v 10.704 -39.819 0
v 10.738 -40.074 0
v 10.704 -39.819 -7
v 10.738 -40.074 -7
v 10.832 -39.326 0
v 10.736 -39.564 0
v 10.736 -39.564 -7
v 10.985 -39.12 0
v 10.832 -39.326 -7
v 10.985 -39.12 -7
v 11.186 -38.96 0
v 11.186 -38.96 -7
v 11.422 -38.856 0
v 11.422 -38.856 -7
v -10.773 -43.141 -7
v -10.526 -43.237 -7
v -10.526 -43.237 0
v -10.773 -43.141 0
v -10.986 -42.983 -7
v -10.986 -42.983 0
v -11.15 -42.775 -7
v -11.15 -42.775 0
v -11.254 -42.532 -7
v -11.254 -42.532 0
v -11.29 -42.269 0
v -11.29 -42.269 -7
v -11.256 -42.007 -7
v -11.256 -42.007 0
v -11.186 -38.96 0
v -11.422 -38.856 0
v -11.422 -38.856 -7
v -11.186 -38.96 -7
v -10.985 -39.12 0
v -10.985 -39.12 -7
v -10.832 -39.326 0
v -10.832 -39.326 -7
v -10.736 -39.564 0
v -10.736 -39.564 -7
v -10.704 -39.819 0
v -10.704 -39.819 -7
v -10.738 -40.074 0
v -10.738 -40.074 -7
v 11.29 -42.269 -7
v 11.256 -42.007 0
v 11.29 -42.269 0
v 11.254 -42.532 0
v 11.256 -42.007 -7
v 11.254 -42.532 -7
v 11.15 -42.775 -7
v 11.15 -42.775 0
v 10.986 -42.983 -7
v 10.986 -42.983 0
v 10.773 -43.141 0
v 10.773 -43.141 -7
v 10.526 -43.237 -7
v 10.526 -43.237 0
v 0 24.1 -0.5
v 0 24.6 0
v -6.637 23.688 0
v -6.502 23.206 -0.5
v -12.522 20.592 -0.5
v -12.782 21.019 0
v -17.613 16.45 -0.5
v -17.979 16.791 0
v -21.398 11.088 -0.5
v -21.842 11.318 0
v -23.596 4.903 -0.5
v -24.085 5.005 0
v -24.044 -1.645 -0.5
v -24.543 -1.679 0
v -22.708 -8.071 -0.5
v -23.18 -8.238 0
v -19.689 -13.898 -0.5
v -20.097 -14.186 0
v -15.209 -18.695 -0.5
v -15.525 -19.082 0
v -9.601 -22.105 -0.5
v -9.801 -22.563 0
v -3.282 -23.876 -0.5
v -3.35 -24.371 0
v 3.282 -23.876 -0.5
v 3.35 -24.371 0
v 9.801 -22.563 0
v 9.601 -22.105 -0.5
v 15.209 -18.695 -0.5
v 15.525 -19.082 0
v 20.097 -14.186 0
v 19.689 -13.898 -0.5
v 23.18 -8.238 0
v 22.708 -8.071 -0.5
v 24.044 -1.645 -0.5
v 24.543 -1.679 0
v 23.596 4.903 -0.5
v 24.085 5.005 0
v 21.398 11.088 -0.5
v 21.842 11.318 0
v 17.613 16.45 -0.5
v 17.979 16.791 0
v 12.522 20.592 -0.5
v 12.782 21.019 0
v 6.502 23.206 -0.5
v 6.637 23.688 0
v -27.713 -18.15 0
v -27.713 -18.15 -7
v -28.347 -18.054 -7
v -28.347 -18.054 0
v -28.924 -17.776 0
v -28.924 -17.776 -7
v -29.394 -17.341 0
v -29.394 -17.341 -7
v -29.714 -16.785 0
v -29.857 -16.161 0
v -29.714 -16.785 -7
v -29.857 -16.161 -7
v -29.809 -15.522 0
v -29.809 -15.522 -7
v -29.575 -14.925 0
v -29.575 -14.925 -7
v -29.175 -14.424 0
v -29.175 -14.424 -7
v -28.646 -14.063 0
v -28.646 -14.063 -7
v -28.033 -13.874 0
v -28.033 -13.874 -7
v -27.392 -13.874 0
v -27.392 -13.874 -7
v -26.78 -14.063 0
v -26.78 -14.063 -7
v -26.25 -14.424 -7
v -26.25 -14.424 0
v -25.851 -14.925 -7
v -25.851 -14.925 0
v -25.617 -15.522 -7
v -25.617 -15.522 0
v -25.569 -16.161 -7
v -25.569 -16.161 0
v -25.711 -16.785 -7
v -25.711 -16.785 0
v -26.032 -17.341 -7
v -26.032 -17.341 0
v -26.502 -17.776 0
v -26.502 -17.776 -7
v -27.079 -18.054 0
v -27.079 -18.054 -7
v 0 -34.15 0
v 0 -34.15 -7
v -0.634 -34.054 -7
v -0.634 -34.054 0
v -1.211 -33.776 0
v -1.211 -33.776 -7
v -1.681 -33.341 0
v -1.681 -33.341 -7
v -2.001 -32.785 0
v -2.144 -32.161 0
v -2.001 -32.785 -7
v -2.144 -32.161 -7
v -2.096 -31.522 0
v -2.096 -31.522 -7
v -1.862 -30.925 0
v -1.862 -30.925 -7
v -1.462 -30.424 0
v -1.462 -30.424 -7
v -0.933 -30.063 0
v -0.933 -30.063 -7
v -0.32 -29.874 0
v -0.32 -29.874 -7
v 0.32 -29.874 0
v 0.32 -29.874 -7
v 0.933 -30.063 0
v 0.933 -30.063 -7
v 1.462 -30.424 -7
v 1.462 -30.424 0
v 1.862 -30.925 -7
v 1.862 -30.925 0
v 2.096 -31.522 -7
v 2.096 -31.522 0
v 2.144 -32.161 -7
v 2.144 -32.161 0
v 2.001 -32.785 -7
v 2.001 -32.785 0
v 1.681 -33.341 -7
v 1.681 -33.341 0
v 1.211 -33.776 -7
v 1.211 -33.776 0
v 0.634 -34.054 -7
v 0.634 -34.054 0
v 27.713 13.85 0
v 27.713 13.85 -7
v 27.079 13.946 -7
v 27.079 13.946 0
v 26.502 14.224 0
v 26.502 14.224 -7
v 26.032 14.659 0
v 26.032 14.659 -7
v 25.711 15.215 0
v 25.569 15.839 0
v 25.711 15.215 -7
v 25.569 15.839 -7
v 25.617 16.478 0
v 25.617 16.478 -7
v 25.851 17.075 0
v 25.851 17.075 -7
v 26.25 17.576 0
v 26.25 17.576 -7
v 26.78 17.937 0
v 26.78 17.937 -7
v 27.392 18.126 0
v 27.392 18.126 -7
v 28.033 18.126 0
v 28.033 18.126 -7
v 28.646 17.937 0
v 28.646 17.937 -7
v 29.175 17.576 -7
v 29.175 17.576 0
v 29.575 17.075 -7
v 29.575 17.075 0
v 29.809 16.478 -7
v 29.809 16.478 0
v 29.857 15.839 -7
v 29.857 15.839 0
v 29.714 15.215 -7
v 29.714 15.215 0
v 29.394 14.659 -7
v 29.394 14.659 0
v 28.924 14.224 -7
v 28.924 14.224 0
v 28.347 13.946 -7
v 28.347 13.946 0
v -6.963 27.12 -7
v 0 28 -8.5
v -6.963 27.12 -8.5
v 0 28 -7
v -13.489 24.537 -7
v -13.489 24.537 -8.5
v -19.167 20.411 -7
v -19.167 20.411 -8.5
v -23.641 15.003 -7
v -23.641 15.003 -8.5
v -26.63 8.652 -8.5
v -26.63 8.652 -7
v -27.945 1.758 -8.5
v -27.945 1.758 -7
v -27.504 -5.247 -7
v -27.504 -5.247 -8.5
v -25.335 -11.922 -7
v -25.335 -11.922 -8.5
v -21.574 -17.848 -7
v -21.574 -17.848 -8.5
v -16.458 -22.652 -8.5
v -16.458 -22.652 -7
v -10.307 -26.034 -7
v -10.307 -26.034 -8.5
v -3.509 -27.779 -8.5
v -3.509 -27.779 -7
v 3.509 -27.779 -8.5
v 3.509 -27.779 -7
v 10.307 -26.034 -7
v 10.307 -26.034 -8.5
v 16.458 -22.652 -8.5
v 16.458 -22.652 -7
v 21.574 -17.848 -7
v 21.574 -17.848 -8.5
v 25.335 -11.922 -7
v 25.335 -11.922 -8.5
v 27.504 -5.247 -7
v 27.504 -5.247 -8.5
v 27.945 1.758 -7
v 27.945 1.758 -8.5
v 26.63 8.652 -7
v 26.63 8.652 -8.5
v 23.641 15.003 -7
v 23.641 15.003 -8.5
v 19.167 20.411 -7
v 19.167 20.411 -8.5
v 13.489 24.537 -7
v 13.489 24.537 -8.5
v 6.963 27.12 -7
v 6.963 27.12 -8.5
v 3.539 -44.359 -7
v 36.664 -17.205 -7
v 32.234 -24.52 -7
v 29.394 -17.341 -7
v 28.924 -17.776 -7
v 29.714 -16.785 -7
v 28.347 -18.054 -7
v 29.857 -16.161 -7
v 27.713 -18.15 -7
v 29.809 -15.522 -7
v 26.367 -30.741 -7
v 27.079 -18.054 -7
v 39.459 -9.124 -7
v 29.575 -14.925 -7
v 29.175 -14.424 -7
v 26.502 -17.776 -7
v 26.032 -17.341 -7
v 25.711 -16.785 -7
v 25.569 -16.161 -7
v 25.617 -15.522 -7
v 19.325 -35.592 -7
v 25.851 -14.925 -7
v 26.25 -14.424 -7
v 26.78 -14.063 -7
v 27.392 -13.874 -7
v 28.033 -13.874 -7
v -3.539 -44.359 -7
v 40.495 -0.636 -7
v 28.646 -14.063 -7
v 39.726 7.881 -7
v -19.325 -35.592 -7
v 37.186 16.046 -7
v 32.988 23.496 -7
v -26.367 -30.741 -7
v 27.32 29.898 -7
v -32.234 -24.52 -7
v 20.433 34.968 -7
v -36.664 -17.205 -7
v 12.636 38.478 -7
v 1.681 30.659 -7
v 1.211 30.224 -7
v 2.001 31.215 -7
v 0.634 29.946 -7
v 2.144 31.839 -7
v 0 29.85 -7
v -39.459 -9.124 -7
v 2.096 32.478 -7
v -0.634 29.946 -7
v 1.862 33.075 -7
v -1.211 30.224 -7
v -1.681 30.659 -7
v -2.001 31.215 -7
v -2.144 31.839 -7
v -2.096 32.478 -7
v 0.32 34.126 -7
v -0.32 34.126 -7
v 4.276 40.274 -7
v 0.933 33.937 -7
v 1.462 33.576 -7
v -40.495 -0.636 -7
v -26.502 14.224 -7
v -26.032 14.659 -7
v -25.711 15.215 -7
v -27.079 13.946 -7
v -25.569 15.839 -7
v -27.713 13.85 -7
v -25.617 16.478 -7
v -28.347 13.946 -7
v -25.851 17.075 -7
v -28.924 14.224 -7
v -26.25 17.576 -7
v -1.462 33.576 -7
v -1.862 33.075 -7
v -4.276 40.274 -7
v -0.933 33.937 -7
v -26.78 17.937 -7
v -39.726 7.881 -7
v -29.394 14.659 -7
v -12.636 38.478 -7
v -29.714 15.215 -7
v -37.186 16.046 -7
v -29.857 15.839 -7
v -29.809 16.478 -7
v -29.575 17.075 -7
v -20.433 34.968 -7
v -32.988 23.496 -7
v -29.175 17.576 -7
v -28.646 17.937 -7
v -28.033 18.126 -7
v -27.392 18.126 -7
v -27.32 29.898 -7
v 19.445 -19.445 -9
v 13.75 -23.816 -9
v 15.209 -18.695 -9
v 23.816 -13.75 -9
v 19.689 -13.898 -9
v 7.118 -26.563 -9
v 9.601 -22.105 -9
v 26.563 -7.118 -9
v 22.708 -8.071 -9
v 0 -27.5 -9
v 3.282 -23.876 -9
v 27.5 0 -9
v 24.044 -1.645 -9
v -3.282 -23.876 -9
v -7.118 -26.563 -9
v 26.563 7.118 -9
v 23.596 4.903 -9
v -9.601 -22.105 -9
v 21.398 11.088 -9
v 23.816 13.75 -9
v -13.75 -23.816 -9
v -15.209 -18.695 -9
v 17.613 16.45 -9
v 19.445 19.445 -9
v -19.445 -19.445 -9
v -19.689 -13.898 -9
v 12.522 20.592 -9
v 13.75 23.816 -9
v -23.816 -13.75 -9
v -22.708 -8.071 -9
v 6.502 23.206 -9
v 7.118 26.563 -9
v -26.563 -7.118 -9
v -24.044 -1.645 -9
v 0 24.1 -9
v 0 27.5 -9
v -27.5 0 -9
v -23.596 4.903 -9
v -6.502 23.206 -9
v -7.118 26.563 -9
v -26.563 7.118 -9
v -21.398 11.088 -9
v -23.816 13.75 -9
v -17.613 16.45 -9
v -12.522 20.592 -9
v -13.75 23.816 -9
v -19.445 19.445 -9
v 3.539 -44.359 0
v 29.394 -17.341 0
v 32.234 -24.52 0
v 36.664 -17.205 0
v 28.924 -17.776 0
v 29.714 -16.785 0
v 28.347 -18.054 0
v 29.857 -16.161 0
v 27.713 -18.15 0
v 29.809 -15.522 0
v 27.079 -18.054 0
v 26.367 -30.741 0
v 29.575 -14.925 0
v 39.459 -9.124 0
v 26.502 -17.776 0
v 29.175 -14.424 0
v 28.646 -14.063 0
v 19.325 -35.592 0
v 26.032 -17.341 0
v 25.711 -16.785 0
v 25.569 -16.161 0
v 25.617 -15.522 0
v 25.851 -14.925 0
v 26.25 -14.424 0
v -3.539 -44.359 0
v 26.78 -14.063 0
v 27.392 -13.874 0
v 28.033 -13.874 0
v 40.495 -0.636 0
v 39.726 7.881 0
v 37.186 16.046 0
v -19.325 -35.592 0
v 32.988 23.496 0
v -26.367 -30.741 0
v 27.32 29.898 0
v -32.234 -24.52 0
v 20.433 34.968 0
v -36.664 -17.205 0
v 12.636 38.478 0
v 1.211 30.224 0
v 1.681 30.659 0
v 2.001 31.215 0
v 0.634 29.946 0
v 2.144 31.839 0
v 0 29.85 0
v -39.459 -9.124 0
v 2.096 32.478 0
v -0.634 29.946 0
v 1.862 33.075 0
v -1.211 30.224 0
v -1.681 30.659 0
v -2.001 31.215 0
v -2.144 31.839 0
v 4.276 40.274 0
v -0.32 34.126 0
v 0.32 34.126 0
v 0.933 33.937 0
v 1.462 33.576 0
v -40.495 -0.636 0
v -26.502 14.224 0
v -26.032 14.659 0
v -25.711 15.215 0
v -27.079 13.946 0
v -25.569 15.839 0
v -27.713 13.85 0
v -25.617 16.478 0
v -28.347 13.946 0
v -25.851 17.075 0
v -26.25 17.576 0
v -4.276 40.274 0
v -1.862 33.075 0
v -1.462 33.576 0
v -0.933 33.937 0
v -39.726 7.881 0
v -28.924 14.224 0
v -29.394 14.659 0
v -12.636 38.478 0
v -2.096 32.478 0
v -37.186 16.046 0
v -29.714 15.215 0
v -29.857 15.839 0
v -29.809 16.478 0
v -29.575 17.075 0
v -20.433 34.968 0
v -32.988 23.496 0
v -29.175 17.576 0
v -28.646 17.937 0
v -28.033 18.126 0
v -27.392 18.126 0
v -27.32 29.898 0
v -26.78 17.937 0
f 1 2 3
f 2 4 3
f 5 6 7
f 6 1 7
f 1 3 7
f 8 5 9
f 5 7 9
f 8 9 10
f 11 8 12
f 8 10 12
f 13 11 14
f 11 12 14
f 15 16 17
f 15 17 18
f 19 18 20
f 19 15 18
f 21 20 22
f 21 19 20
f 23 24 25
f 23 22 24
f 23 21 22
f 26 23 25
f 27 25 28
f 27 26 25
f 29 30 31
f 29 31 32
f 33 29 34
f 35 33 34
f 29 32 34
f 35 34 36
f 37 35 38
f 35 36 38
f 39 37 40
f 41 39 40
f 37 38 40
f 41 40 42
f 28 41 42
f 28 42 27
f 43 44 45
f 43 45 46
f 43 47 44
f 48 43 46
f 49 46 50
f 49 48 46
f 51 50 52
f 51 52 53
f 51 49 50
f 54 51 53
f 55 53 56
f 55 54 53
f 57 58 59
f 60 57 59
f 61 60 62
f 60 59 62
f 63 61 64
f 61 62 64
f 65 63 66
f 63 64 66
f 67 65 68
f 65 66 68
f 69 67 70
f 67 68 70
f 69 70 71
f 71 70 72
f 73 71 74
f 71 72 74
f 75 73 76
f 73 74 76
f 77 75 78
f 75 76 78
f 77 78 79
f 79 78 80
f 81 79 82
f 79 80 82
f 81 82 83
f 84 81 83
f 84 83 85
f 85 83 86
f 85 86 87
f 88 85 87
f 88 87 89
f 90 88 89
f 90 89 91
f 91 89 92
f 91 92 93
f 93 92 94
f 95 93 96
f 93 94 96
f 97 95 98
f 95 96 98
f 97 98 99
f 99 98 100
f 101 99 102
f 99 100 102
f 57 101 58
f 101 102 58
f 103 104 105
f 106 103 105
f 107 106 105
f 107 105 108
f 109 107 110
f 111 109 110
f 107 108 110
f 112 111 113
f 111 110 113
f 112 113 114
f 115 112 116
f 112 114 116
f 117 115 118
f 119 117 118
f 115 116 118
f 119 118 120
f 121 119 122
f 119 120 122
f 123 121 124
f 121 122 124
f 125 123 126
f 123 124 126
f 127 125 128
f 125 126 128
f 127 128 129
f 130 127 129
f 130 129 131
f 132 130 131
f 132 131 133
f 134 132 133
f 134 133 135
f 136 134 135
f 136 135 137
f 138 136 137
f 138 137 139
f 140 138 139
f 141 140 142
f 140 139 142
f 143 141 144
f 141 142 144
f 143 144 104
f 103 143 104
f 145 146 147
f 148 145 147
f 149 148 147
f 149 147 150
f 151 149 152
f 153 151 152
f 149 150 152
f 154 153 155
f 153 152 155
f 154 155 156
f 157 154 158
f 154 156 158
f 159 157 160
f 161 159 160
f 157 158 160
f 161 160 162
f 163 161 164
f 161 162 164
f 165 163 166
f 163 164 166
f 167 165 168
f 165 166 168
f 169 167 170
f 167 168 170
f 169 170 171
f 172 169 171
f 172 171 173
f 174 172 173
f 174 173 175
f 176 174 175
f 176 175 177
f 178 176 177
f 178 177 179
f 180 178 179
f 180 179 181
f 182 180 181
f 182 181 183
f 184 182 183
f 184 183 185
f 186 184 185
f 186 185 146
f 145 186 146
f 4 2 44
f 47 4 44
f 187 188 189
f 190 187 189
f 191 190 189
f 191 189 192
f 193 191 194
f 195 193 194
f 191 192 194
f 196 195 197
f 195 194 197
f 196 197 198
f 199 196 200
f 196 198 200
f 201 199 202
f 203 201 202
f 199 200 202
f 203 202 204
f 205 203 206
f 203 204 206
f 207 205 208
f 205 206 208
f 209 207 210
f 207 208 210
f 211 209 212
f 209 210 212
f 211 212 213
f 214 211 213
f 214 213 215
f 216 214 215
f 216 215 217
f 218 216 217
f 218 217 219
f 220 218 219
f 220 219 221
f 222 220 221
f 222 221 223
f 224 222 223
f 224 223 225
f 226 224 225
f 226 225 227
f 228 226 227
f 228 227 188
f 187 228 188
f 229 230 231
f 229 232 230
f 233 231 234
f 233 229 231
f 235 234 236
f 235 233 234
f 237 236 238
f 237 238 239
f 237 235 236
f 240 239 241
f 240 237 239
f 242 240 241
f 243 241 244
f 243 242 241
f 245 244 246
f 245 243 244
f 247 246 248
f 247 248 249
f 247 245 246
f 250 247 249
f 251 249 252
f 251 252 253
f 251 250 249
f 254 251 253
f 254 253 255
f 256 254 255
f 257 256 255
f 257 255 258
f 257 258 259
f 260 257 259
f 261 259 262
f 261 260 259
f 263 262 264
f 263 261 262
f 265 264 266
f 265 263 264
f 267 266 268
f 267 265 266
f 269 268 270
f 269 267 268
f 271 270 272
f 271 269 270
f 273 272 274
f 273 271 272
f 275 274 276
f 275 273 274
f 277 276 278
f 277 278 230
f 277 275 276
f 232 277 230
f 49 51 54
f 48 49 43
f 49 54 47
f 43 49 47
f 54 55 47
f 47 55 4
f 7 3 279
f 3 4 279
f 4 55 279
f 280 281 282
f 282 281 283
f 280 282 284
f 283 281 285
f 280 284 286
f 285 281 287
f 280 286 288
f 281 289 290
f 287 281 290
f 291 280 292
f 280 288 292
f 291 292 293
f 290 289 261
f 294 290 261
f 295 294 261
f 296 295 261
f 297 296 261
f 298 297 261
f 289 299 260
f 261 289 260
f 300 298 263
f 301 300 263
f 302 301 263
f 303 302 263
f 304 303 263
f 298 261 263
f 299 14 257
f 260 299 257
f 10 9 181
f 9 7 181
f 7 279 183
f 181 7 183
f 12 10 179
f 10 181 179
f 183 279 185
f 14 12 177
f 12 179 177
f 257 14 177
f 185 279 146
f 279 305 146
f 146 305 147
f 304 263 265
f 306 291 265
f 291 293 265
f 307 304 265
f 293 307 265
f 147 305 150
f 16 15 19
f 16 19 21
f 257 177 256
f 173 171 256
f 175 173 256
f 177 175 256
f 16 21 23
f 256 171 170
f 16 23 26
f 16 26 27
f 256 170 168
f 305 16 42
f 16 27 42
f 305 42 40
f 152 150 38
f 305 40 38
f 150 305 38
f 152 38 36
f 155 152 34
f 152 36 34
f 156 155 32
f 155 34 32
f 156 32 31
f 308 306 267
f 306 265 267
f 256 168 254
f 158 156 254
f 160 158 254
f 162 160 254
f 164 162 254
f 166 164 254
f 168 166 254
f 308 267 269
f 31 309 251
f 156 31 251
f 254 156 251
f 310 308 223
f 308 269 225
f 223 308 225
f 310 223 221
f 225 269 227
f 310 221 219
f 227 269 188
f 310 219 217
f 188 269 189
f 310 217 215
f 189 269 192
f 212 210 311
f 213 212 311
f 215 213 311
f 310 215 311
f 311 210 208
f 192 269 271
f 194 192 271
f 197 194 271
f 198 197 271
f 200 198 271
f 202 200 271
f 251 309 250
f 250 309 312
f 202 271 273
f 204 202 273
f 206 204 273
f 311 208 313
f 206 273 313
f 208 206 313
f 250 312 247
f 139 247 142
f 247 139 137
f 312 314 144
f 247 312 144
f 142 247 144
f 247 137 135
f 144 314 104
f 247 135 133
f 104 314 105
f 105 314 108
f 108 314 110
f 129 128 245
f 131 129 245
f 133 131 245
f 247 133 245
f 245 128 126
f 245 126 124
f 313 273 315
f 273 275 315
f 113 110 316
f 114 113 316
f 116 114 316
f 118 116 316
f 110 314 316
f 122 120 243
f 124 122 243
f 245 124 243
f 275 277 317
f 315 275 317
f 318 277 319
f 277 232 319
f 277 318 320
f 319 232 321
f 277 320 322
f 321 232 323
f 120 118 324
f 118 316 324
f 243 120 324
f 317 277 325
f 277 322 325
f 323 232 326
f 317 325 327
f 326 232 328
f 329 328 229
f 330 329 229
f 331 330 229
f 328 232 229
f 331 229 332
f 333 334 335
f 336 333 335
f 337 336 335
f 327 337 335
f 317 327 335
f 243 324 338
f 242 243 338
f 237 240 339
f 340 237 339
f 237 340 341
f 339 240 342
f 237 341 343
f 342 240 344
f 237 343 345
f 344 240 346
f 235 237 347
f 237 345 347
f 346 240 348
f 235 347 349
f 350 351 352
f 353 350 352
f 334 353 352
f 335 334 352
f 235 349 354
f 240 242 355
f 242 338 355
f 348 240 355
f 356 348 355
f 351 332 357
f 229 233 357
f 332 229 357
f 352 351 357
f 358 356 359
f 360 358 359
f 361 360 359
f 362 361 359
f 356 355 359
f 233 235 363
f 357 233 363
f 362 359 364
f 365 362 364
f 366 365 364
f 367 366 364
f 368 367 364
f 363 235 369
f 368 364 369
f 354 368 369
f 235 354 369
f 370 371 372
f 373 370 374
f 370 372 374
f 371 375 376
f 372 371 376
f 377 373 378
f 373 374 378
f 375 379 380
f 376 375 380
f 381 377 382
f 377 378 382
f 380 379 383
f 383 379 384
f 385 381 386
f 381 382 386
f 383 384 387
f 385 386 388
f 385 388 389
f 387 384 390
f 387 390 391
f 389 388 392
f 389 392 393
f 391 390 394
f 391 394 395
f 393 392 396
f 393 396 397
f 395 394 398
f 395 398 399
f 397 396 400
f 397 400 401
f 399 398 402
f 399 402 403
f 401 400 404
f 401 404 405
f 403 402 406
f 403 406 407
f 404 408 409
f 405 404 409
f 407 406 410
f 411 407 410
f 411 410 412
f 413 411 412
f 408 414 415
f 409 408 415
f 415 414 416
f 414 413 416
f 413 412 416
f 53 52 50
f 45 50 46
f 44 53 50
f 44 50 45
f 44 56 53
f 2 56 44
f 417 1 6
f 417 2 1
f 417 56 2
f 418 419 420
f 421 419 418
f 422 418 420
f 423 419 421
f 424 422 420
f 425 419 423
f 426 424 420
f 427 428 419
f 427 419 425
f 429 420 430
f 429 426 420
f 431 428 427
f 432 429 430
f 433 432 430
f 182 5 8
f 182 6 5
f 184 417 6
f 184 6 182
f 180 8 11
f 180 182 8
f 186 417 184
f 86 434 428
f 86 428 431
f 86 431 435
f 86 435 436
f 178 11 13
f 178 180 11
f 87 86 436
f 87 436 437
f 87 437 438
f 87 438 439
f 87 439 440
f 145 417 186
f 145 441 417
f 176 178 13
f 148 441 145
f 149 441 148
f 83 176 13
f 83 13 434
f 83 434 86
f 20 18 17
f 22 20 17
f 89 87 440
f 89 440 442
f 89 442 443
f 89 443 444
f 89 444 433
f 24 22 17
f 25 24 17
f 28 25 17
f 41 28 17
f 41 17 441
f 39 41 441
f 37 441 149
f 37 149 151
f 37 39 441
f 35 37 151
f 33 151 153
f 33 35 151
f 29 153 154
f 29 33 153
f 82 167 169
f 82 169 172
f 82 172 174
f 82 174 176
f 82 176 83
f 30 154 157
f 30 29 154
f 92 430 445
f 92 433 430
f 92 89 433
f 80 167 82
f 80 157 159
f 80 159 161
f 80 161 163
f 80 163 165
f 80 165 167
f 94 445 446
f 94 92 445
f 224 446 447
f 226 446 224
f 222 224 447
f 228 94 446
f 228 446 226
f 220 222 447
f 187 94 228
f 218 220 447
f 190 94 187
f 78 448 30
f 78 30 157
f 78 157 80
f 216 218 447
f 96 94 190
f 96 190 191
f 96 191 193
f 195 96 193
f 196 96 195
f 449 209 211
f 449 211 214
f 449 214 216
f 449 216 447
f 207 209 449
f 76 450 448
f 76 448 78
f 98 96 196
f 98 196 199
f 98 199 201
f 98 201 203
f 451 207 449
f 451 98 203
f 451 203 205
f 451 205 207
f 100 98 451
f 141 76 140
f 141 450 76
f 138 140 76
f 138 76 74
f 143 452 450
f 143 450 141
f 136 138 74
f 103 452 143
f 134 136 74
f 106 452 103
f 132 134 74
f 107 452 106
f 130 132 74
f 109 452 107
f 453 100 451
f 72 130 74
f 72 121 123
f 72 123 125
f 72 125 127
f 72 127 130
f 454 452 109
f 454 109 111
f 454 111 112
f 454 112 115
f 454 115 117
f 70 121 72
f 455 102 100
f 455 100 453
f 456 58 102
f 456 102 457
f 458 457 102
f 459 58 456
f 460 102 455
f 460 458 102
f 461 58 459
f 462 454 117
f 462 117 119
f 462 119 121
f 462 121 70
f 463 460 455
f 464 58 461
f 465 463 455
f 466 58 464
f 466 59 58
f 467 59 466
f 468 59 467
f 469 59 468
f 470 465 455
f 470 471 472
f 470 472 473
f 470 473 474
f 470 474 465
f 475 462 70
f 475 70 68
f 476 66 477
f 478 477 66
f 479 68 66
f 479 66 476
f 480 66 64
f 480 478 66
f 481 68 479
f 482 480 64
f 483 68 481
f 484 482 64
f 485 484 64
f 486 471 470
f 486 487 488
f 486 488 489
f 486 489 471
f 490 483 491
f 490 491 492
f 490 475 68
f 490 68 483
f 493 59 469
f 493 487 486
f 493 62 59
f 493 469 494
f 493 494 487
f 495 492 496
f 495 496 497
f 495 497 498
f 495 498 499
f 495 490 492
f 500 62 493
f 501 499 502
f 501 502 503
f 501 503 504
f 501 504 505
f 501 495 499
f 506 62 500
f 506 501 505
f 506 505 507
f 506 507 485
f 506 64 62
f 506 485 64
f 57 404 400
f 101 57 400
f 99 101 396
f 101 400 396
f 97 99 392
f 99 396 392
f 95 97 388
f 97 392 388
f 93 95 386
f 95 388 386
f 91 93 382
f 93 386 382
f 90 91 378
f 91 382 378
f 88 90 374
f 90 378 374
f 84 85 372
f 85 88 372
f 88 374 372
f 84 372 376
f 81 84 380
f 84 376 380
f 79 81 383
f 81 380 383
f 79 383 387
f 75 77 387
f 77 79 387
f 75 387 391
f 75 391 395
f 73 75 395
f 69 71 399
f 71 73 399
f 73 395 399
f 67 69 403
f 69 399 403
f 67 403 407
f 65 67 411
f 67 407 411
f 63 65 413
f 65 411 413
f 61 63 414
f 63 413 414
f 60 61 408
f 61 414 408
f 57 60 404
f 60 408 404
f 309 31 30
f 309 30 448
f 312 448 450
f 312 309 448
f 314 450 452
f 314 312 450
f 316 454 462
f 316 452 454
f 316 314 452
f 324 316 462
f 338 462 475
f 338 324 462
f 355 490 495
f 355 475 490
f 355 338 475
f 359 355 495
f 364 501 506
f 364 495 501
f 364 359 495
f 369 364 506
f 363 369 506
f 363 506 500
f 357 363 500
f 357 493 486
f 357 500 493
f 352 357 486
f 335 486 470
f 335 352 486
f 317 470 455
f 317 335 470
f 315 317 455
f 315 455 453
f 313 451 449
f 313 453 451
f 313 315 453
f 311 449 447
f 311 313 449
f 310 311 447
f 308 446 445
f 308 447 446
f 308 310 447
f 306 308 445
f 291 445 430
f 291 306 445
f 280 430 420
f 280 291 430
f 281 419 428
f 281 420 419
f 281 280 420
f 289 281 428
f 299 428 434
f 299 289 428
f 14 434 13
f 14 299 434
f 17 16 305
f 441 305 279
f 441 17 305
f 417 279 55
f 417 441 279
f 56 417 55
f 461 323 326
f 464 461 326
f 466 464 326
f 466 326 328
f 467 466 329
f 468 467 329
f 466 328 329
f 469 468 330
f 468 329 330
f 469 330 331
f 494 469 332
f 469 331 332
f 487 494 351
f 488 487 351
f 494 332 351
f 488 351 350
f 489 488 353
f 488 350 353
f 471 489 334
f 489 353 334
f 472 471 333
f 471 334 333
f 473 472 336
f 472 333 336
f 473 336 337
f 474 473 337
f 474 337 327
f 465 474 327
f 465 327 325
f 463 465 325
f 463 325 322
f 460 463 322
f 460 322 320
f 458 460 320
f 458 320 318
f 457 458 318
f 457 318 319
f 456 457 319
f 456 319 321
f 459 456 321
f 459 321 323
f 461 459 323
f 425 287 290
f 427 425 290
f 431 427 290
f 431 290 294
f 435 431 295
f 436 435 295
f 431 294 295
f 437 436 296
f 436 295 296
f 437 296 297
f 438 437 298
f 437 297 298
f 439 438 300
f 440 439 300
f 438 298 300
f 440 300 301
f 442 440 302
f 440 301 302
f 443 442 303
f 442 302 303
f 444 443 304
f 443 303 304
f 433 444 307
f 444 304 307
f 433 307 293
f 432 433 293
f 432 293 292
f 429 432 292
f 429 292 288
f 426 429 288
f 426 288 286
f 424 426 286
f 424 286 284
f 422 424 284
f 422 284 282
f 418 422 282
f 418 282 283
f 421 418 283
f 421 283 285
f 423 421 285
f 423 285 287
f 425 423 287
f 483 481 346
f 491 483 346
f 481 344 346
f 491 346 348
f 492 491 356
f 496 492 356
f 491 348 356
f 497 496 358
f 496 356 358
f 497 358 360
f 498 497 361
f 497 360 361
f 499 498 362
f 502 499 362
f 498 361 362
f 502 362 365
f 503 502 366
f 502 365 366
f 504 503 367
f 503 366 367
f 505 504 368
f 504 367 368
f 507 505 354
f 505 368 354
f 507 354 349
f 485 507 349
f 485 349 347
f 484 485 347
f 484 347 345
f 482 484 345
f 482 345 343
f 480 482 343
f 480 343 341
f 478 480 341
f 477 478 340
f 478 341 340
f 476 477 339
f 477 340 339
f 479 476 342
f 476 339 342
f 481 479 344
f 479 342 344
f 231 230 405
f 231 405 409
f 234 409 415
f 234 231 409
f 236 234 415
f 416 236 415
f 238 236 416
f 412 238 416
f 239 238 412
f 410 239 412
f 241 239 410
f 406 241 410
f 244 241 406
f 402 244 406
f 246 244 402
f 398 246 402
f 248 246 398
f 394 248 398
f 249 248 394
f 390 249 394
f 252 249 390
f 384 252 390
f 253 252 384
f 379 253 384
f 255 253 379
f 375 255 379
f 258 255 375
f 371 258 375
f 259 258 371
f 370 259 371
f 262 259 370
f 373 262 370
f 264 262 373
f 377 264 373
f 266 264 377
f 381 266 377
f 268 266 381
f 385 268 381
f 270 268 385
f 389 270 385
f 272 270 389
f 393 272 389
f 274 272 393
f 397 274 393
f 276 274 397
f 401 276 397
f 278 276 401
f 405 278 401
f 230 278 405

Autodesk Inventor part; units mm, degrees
ref_plane "YZ Plane" through (0, 0, 0) normal (1, 0, 0) x (0, 1, 0)
ref_plane "XZ Plane" through (0, 0, 0) normal (0, 1, 0) x (-1, 0, 0)
ref_plane "XY Plane" through (0, 0, 0) normal (0, 0, 1) x (1, 0, 0)
sketch "スケッチ2" plane through (0, 0, 0) normal (1, 0, 0) x (0, 1, 0)
  line L0 (24.1, 0) -> (24.1, -9)
  line L1 (40.5, 0) -> (40.5, -7)
  line L2 (40.5, 0) -> (24.1, 0)
  line L3 (24.1, 0) -> (59, 0)
  line L4 (24.1, -9) -> (28, -9)
  line L5 (0, -10.8) -> (0, 1.8) projected
  line L6 (28, -9) -> (28, -7)
  line L7 (28, -7) -> (40.5, -7)
  point P0 (0, 0)
  dimension "d40" = 24.1
  dimension "d41" = 7
  dimension "d42" = 40.5
  dimension "d43" = 28
  dimension "d44" = 2
revolve "回転1" add sketch "スケッチ2" angle 360 about axis through (0, 0, -10) along (0, 0, 1)
sketch "スケッチ4" plane through (0, 0, 0) normal (0, 0, 1) x (1, 0, 0)
  point P0 (0, 0)
  point P1 (0, 32)
  point P2 (-27.7128, 16)
  point P3 (-27.7128, -16)
  point P4 (0, -32)
  point P5 (27.7128, -16)
  point P6 (27.7128, 16)
  dimension "d11" = 32
  dimension "d14" = 360
hole "穴1" at (0, 32, 0) at (-27.7128, 16, 0) at (-27.7128, -16, 0) at (0, -32, 0) at (27.7128, -16, 0) at (27.7128, 16, 0) direction (0, 0, -1) diameter 4.3 end through all clearance for "Socket Head Cap Screw" size "M4" standard "Ansi Metric M Profile"
chamfer "面取り3" distance 0.5 angle 45 1 edges at (0, -28, -9)
chamfer "面取り4" distance 0.5 angle 45 1 edges at (0, -24.1, 0)
sketch "スケッチ7" plane through (0, 0, 0) normal (0, 0, 1) x (1, 0, 0)
  circle A0 centre (0, 0) radius 40.5 projected
  circle A1 centre (0, 0) radius 44.5
  line L0 (0, 0) -> (11.5174, -42.9837)
  line L1 (0, 0) -> (-11.5174, -42.9837)
  line L2 (0, 62.3) -> (0, -62.3) projected
  point P0 (10.4822, -39.12)
  point P1 (-10.4822, -39.12)
  dimension "d51" = 4
  dimension "d52" = 15
  dimension "d53" = 15
extrude "押し出し3" add sketch "スケッチ7" against normal up to surface (7 mm away) contours L0 A1 L2 A0 | A0 L2 A1 L1 picked at (6.2128, -42.6798) picked at (-1.2928, -43.1102)
fillet "フィレット1" radius 1 4 edges at (10.4822, -39.12, -3.5) (11.5174, -42.9837, -3.5) (-10.4822, -39.12, -3.5) (-11.5174, -42.9837, -3.5)
properties part number "base12" material "ABS プラスチック"
